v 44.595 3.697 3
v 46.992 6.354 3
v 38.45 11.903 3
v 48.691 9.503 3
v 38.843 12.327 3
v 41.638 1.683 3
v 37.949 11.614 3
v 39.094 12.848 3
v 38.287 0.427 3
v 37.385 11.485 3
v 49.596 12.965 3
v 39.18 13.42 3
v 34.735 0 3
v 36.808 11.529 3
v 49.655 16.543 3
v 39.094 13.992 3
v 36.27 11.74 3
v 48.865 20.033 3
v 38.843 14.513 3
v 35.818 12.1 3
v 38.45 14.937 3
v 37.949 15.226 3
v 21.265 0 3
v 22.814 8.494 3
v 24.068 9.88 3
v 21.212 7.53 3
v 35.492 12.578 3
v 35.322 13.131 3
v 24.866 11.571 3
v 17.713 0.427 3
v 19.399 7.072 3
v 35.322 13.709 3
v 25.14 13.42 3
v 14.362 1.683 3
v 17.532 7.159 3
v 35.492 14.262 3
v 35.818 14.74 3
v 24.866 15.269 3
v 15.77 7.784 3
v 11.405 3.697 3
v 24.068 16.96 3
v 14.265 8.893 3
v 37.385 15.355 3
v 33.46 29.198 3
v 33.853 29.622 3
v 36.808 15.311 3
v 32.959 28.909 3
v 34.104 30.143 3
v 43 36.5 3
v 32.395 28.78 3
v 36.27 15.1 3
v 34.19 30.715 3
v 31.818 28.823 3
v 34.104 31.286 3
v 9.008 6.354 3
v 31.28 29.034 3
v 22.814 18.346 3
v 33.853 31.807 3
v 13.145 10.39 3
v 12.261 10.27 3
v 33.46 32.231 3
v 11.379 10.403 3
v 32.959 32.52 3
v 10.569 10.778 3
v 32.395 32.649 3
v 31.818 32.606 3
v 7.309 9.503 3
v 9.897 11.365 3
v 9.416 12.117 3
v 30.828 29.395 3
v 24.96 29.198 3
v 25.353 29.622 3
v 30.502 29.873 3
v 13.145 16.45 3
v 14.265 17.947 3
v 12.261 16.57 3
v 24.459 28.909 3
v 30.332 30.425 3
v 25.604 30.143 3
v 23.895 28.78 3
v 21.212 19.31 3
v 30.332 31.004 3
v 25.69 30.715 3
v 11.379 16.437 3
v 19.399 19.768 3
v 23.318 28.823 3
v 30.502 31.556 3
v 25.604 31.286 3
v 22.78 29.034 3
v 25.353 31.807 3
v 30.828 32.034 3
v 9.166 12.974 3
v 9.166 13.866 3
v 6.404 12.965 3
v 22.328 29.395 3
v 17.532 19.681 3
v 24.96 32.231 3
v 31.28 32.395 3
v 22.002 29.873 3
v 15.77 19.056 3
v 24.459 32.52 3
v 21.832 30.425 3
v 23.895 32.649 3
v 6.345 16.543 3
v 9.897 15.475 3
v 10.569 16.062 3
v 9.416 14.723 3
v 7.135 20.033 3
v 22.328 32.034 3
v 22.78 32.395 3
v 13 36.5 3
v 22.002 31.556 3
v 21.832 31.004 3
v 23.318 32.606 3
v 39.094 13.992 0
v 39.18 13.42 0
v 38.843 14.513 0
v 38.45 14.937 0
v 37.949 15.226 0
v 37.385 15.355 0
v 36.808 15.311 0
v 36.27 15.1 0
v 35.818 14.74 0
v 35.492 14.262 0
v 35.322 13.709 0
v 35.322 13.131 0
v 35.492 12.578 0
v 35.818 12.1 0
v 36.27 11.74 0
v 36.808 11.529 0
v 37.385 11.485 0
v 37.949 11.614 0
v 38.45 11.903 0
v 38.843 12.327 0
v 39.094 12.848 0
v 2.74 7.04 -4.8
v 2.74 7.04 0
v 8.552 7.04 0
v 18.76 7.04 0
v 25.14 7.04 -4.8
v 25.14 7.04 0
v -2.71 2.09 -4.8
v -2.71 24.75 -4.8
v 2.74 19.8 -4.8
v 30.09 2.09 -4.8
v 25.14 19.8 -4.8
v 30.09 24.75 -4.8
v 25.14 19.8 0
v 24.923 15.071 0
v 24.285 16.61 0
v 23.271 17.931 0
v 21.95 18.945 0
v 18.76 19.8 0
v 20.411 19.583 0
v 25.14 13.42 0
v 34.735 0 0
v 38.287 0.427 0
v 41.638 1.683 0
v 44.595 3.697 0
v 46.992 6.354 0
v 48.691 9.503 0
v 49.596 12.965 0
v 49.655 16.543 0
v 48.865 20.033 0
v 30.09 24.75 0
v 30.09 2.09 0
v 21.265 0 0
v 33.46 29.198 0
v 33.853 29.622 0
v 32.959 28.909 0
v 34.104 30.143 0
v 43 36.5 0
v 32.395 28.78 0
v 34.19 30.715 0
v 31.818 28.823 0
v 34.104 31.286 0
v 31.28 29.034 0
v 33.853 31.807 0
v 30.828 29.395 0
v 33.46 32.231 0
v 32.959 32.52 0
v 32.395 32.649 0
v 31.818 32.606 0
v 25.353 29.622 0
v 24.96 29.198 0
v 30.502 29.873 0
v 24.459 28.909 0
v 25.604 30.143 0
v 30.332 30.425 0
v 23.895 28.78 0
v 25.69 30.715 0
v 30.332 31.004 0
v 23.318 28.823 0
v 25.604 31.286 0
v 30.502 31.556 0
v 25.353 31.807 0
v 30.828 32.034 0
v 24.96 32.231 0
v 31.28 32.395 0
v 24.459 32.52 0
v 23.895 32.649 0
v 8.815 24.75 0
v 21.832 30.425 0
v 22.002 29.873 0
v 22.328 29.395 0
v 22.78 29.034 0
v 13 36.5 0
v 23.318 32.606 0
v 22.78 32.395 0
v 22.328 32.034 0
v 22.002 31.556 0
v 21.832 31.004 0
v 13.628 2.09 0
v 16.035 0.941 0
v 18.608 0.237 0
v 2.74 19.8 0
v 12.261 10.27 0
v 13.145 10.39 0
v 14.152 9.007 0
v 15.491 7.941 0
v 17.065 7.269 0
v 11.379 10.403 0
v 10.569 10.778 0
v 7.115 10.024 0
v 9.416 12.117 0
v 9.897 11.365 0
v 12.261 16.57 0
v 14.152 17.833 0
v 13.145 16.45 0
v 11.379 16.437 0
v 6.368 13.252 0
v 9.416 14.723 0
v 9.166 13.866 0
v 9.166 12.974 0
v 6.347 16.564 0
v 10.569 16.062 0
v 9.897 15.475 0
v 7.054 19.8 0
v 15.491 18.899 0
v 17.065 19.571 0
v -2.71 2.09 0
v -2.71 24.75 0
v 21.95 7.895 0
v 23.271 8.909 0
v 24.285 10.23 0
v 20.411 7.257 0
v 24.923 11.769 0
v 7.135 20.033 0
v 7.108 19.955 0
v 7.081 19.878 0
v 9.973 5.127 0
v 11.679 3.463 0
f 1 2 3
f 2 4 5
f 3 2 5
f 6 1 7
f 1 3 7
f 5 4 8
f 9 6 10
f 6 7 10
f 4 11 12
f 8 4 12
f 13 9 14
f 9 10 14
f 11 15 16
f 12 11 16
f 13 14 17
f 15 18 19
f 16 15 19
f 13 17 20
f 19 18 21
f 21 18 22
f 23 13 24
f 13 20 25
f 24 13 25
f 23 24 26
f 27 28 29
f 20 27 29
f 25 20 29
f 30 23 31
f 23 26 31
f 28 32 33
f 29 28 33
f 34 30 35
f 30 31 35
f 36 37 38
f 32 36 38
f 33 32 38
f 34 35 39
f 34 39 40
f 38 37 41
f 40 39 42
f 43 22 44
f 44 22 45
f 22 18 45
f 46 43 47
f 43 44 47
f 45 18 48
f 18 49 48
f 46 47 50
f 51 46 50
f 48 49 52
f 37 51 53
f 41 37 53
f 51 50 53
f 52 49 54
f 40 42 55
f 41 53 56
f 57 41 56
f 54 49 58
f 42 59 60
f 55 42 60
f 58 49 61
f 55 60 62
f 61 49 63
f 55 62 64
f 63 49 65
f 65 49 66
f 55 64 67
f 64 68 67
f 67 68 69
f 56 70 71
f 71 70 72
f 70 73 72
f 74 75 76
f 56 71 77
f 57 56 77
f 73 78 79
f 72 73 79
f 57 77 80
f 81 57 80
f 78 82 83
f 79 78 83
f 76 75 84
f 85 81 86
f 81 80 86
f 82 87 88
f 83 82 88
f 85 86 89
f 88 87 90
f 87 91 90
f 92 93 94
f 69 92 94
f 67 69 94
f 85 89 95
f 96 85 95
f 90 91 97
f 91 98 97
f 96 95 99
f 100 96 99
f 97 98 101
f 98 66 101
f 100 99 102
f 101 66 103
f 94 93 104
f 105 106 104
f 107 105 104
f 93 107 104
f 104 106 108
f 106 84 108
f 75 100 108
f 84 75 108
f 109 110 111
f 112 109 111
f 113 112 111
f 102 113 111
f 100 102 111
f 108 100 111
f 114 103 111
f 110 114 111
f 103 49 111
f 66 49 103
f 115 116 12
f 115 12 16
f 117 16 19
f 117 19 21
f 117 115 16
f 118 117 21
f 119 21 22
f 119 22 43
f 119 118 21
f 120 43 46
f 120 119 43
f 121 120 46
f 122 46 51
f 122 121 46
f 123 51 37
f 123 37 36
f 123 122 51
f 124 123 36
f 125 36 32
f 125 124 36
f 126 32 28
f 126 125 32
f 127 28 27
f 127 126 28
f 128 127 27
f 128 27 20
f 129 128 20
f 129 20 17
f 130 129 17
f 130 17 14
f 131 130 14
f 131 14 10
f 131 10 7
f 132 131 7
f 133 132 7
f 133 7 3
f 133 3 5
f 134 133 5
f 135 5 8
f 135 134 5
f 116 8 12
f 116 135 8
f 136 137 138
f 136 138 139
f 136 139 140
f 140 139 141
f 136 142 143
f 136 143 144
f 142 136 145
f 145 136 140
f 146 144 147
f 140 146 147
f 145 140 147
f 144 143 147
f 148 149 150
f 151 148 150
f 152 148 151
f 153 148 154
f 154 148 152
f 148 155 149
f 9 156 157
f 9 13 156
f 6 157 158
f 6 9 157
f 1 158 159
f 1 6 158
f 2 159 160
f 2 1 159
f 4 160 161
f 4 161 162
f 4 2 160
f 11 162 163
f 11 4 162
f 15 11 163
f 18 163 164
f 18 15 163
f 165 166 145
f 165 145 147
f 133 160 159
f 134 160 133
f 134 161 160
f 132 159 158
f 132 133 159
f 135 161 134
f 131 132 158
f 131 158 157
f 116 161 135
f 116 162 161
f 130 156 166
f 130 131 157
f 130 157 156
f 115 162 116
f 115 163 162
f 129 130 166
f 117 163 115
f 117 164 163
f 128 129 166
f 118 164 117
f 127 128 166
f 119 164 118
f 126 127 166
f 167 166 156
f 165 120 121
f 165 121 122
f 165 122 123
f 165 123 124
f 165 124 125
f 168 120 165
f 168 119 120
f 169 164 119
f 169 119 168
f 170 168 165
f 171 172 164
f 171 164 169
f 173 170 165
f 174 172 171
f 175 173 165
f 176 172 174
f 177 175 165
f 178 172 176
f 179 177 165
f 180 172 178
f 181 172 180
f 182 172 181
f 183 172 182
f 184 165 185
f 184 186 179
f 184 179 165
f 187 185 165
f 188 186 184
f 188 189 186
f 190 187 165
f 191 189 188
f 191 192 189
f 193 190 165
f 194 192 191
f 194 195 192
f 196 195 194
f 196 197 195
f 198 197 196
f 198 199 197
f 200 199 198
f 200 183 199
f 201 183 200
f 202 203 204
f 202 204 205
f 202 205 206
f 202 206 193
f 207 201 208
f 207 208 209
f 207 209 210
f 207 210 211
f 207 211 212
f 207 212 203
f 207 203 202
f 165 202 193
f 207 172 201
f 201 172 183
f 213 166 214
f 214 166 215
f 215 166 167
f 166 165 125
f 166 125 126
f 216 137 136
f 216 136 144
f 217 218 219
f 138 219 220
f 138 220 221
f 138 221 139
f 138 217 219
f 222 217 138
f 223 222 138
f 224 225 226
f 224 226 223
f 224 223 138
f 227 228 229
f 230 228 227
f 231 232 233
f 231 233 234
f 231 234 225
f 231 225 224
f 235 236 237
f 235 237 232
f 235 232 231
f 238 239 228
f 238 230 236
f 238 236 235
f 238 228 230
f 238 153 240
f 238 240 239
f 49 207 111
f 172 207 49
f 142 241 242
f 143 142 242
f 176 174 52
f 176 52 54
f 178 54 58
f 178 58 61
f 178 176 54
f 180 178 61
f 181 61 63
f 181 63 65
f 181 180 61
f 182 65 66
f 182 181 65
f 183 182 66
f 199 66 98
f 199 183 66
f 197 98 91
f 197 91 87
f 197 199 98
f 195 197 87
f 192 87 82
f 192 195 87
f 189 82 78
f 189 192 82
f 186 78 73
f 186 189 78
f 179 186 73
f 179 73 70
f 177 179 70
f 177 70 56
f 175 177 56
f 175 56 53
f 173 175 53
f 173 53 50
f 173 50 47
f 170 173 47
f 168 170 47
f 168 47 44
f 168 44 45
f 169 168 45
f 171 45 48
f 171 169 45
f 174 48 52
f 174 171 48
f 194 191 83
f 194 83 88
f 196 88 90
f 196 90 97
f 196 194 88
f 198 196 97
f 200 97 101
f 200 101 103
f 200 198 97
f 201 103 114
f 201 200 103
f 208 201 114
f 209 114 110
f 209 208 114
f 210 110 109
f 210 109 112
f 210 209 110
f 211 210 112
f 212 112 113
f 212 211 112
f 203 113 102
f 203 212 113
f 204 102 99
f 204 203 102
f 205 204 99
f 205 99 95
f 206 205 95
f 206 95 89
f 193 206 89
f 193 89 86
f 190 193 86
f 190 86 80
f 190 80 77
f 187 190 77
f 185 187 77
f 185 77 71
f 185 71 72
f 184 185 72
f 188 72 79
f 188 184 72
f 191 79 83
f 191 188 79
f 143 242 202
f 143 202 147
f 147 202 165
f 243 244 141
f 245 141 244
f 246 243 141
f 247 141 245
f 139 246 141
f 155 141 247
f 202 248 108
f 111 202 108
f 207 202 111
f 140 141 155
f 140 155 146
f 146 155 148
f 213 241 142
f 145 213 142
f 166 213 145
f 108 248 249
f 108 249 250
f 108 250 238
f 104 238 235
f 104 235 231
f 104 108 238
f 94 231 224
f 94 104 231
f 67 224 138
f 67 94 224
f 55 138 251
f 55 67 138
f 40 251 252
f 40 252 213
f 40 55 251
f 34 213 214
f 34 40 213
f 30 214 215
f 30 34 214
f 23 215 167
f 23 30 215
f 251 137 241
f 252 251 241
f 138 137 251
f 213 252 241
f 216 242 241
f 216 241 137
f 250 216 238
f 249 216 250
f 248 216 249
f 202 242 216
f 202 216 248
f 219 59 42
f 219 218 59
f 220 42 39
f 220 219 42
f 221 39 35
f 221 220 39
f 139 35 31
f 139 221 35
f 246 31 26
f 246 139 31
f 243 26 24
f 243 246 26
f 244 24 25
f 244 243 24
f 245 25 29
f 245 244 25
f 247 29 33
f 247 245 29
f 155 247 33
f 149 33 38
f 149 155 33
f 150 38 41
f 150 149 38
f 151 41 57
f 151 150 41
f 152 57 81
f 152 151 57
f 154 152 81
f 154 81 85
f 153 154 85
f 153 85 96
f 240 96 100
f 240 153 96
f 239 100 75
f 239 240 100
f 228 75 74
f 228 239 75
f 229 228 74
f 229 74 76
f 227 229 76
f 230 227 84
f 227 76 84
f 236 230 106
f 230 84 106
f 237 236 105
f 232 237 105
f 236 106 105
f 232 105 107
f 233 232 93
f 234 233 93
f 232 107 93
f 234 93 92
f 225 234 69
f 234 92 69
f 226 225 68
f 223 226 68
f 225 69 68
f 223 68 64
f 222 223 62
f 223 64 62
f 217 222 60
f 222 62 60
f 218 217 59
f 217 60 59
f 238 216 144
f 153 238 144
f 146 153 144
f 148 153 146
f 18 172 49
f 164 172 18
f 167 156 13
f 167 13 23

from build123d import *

# Parameters (mm, degrees)
SKETCH004_W      = 32.8
SKETCH004_H      = 22.66
SKETCH004_W_2    = 22.4
SKETCH004_H_2    = 12.76
EXTRUDE002_DEPTH = 4.8
SKETCH_R         = 3.15
EXTRUDE001_DEPTH = 5
SKETCH003_R      = 1.94
SKETCH003_R_2    = 6.38
EXTRUDE_DEPTH    = 3
FILLET_R         = 15


with BuildPart() as extrude002:
    # Sketch004 → Extrude002 (new body)
    with BuildSketch(Plane.XY):
        with Locations((13.69, 13.42)):
            Rectangle(SKETCH004_W, SKETCH004_H)
        with Locations((13.94, 13.42)):
            Rectangle(SKETCH004_W_2, SKETCH004_H_2, mode=Mode.SUBTRACT)
    extrude(amount=-EXTRUDE002_DEPTH)


with BuildPart() as extrude001:
    # Sketch (on Face5 of Fillet) → Extrude001 (new body, symmetric)
    with BuildSketch(Plane.XY.offset(3)):
        with Locations((12.283935, 13.42)):
            Circle(SKETCH_R)
    extrude(amount=EXTRUDE001_DEPTH, both=True)


with BuildPart() as fusion:
    # Sketch003 → Extrude (new body)
    with BuildSketch(Plane.XY):
        Polygon((0, 0), (13, 36.5), (43, 36.5), (56, 0), align=None)
        with Locations((23.75, 30.714505)):
            Circle(SKETCH003_R, mode=Mode.SUBTRACT)
        with Locations((32.25, 30.714505)):
            Circle(SKETCH003_R, mode=Mode.SUBTRACT)
        with Locations((37.24, 13.42)):
            Circle(SKETCH003_R, mode=Mode.SUBTRACT)
        with Locations((18.76, 13.42)):
            Circle(SKETCH003_R_2, mode=Mode.SUBTRACT)
    extrude(amount=EXTRUDE_DEPTH)

    # Fillet
    fillet_edges = [fusion.edges().sort_by_distance(p)[0] for p in [
        (0, 0, 1.5),
        (56, 0, 1.5),
    ]]
    fillet(fillet_edges, radius=FILLET_R)

    # Cut: cut Extrude001
    add(extrude001.part, mode=Mode.SUBTRACT)

    # Fusion: union Extrude002
    add(extrude002.part)


solid = fusion.part
